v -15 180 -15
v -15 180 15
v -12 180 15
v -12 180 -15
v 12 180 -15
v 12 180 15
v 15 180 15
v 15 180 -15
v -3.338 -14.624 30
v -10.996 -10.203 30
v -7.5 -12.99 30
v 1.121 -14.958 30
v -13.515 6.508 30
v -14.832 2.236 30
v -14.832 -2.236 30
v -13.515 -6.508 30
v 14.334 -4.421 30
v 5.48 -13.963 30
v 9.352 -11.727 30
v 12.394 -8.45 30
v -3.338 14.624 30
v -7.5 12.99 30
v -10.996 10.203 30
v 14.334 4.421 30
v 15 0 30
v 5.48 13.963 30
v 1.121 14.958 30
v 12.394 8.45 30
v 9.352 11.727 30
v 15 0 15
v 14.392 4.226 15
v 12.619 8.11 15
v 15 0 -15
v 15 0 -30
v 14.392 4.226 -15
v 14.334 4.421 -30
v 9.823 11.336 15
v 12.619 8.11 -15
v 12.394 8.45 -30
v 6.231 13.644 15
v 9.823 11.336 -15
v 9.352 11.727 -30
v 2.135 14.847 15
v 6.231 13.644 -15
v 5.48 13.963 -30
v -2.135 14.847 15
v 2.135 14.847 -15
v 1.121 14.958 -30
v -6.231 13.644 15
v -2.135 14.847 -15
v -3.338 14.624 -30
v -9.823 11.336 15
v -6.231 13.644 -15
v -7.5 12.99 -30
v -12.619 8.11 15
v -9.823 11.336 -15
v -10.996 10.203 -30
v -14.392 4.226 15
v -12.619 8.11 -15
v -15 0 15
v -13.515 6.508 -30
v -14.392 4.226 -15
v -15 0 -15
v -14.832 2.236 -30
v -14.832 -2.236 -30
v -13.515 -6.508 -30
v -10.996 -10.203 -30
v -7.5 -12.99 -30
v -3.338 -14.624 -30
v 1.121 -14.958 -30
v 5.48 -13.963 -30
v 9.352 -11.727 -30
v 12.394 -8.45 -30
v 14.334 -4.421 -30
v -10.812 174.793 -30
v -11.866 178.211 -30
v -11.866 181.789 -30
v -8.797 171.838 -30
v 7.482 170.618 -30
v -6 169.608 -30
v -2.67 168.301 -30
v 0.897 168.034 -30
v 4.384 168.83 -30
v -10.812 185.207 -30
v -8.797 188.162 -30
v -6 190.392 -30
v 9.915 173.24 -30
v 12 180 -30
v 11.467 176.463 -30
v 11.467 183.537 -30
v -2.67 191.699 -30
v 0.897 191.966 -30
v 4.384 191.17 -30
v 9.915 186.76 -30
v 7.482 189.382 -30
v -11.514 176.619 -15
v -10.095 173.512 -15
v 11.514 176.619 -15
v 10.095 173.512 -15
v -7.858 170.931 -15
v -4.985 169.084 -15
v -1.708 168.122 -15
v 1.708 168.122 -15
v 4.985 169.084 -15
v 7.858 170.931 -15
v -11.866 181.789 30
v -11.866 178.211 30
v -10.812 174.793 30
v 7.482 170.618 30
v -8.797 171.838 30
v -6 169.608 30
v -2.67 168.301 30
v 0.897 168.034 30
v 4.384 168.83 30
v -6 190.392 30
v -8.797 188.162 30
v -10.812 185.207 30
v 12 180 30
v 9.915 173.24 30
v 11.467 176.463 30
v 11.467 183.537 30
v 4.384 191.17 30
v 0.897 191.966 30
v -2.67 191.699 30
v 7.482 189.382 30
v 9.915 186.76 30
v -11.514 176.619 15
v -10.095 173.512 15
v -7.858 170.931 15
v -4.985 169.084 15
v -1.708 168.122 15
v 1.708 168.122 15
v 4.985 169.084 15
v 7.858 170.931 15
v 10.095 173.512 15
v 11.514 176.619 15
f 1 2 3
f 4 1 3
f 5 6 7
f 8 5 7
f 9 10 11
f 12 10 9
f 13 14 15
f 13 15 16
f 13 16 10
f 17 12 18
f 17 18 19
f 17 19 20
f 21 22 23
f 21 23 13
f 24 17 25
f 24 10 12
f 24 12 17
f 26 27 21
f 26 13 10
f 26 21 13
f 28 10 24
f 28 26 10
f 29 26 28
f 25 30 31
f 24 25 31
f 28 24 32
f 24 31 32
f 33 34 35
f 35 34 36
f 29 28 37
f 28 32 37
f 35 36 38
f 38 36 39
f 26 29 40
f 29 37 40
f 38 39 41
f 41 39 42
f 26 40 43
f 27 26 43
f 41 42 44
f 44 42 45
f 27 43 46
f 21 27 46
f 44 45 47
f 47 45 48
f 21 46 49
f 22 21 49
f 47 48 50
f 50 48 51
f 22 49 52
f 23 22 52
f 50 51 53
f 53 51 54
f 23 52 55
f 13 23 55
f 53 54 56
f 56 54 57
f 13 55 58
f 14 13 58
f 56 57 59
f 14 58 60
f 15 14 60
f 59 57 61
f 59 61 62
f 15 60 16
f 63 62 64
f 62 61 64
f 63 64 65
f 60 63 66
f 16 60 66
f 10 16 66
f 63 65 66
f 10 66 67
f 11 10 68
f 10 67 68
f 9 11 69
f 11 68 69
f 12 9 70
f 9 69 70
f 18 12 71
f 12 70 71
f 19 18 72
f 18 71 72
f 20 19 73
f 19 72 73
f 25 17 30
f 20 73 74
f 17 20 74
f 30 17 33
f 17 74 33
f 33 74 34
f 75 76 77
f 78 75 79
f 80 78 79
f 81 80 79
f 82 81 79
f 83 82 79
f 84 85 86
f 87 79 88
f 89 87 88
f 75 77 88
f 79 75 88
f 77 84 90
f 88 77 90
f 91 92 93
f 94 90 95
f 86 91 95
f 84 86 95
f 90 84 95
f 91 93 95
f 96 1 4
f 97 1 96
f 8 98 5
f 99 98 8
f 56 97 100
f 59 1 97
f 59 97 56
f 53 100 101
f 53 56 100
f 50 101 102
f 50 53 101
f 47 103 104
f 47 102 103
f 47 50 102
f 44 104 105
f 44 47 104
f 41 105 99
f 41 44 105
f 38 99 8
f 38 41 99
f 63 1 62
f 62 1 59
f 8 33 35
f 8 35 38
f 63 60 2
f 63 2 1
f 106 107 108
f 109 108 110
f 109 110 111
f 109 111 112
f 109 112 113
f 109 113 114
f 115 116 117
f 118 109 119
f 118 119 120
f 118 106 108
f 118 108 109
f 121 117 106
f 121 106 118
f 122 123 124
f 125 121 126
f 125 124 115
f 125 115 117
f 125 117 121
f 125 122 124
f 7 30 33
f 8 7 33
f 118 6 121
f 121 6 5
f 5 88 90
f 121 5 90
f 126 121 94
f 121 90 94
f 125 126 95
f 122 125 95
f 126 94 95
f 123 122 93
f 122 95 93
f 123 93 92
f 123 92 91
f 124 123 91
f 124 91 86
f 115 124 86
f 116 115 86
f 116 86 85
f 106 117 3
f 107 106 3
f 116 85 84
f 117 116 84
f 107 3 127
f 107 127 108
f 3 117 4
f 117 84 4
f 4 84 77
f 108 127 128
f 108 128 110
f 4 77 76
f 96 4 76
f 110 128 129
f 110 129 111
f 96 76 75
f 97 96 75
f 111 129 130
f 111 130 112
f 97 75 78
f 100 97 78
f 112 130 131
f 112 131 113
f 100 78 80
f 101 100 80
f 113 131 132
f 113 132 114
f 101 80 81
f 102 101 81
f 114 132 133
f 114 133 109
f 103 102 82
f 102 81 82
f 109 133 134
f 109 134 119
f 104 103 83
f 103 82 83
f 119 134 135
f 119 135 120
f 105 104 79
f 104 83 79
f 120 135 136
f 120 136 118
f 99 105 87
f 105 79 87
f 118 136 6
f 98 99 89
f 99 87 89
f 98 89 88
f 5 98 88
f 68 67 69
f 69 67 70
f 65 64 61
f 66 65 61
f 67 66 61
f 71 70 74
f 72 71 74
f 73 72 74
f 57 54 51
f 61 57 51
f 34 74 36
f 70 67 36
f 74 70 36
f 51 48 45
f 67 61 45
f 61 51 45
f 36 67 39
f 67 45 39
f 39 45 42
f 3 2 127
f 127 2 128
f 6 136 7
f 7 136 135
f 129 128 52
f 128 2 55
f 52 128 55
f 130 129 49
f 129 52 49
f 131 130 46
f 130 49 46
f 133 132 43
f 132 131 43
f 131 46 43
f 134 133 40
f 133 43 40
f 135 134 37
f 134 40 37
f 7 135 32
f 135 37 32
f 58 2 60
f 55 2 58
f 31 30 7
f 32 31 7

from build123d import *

# Parameters (mm, degrees)
SKETCH1_W                = 30
SKETCH1_H                = 30
BOSS_EXTRUDE1_DEPTH      = 180
BOSS_EXTRUDE2_DEPTH      = 30
BOSS_EXTRUDE2_DEPTH_BACK = 30
SKETCH2_R                = 15
SKETCH2_R_2              = 12


with BuildPart() as part:
    # Sketch1 → Boss-Extrude1 (new body)
    with BuildSketch(Plane(origin=(0, 0, 0), x_dir=(1, 0, 0), z_dir=(0, 1, 0))):
        Rectangle(SKETCH1_W, SKETCH1_H)
    extrude(amount=BOSS_EXTRUDE1_DEPTH)

    # Sketch2 → Boss-Extrude2 (add, two sides: drawn at the far end of the back side and taken through both)
    with BuildSketch(Plane.XY.offset(-BOSS_EXTRUDE2_DEPTH_BACK)):
        Circle(SKETCH2_R)
        with Locations((0, 180)):
            Circle(SKETCH2_R_2)
    extrude(amount=BOSS_EXTRUDE2_DEPTH + BOSS_EXTRUDE2_DEPTH_BACK)


solid = part.part
